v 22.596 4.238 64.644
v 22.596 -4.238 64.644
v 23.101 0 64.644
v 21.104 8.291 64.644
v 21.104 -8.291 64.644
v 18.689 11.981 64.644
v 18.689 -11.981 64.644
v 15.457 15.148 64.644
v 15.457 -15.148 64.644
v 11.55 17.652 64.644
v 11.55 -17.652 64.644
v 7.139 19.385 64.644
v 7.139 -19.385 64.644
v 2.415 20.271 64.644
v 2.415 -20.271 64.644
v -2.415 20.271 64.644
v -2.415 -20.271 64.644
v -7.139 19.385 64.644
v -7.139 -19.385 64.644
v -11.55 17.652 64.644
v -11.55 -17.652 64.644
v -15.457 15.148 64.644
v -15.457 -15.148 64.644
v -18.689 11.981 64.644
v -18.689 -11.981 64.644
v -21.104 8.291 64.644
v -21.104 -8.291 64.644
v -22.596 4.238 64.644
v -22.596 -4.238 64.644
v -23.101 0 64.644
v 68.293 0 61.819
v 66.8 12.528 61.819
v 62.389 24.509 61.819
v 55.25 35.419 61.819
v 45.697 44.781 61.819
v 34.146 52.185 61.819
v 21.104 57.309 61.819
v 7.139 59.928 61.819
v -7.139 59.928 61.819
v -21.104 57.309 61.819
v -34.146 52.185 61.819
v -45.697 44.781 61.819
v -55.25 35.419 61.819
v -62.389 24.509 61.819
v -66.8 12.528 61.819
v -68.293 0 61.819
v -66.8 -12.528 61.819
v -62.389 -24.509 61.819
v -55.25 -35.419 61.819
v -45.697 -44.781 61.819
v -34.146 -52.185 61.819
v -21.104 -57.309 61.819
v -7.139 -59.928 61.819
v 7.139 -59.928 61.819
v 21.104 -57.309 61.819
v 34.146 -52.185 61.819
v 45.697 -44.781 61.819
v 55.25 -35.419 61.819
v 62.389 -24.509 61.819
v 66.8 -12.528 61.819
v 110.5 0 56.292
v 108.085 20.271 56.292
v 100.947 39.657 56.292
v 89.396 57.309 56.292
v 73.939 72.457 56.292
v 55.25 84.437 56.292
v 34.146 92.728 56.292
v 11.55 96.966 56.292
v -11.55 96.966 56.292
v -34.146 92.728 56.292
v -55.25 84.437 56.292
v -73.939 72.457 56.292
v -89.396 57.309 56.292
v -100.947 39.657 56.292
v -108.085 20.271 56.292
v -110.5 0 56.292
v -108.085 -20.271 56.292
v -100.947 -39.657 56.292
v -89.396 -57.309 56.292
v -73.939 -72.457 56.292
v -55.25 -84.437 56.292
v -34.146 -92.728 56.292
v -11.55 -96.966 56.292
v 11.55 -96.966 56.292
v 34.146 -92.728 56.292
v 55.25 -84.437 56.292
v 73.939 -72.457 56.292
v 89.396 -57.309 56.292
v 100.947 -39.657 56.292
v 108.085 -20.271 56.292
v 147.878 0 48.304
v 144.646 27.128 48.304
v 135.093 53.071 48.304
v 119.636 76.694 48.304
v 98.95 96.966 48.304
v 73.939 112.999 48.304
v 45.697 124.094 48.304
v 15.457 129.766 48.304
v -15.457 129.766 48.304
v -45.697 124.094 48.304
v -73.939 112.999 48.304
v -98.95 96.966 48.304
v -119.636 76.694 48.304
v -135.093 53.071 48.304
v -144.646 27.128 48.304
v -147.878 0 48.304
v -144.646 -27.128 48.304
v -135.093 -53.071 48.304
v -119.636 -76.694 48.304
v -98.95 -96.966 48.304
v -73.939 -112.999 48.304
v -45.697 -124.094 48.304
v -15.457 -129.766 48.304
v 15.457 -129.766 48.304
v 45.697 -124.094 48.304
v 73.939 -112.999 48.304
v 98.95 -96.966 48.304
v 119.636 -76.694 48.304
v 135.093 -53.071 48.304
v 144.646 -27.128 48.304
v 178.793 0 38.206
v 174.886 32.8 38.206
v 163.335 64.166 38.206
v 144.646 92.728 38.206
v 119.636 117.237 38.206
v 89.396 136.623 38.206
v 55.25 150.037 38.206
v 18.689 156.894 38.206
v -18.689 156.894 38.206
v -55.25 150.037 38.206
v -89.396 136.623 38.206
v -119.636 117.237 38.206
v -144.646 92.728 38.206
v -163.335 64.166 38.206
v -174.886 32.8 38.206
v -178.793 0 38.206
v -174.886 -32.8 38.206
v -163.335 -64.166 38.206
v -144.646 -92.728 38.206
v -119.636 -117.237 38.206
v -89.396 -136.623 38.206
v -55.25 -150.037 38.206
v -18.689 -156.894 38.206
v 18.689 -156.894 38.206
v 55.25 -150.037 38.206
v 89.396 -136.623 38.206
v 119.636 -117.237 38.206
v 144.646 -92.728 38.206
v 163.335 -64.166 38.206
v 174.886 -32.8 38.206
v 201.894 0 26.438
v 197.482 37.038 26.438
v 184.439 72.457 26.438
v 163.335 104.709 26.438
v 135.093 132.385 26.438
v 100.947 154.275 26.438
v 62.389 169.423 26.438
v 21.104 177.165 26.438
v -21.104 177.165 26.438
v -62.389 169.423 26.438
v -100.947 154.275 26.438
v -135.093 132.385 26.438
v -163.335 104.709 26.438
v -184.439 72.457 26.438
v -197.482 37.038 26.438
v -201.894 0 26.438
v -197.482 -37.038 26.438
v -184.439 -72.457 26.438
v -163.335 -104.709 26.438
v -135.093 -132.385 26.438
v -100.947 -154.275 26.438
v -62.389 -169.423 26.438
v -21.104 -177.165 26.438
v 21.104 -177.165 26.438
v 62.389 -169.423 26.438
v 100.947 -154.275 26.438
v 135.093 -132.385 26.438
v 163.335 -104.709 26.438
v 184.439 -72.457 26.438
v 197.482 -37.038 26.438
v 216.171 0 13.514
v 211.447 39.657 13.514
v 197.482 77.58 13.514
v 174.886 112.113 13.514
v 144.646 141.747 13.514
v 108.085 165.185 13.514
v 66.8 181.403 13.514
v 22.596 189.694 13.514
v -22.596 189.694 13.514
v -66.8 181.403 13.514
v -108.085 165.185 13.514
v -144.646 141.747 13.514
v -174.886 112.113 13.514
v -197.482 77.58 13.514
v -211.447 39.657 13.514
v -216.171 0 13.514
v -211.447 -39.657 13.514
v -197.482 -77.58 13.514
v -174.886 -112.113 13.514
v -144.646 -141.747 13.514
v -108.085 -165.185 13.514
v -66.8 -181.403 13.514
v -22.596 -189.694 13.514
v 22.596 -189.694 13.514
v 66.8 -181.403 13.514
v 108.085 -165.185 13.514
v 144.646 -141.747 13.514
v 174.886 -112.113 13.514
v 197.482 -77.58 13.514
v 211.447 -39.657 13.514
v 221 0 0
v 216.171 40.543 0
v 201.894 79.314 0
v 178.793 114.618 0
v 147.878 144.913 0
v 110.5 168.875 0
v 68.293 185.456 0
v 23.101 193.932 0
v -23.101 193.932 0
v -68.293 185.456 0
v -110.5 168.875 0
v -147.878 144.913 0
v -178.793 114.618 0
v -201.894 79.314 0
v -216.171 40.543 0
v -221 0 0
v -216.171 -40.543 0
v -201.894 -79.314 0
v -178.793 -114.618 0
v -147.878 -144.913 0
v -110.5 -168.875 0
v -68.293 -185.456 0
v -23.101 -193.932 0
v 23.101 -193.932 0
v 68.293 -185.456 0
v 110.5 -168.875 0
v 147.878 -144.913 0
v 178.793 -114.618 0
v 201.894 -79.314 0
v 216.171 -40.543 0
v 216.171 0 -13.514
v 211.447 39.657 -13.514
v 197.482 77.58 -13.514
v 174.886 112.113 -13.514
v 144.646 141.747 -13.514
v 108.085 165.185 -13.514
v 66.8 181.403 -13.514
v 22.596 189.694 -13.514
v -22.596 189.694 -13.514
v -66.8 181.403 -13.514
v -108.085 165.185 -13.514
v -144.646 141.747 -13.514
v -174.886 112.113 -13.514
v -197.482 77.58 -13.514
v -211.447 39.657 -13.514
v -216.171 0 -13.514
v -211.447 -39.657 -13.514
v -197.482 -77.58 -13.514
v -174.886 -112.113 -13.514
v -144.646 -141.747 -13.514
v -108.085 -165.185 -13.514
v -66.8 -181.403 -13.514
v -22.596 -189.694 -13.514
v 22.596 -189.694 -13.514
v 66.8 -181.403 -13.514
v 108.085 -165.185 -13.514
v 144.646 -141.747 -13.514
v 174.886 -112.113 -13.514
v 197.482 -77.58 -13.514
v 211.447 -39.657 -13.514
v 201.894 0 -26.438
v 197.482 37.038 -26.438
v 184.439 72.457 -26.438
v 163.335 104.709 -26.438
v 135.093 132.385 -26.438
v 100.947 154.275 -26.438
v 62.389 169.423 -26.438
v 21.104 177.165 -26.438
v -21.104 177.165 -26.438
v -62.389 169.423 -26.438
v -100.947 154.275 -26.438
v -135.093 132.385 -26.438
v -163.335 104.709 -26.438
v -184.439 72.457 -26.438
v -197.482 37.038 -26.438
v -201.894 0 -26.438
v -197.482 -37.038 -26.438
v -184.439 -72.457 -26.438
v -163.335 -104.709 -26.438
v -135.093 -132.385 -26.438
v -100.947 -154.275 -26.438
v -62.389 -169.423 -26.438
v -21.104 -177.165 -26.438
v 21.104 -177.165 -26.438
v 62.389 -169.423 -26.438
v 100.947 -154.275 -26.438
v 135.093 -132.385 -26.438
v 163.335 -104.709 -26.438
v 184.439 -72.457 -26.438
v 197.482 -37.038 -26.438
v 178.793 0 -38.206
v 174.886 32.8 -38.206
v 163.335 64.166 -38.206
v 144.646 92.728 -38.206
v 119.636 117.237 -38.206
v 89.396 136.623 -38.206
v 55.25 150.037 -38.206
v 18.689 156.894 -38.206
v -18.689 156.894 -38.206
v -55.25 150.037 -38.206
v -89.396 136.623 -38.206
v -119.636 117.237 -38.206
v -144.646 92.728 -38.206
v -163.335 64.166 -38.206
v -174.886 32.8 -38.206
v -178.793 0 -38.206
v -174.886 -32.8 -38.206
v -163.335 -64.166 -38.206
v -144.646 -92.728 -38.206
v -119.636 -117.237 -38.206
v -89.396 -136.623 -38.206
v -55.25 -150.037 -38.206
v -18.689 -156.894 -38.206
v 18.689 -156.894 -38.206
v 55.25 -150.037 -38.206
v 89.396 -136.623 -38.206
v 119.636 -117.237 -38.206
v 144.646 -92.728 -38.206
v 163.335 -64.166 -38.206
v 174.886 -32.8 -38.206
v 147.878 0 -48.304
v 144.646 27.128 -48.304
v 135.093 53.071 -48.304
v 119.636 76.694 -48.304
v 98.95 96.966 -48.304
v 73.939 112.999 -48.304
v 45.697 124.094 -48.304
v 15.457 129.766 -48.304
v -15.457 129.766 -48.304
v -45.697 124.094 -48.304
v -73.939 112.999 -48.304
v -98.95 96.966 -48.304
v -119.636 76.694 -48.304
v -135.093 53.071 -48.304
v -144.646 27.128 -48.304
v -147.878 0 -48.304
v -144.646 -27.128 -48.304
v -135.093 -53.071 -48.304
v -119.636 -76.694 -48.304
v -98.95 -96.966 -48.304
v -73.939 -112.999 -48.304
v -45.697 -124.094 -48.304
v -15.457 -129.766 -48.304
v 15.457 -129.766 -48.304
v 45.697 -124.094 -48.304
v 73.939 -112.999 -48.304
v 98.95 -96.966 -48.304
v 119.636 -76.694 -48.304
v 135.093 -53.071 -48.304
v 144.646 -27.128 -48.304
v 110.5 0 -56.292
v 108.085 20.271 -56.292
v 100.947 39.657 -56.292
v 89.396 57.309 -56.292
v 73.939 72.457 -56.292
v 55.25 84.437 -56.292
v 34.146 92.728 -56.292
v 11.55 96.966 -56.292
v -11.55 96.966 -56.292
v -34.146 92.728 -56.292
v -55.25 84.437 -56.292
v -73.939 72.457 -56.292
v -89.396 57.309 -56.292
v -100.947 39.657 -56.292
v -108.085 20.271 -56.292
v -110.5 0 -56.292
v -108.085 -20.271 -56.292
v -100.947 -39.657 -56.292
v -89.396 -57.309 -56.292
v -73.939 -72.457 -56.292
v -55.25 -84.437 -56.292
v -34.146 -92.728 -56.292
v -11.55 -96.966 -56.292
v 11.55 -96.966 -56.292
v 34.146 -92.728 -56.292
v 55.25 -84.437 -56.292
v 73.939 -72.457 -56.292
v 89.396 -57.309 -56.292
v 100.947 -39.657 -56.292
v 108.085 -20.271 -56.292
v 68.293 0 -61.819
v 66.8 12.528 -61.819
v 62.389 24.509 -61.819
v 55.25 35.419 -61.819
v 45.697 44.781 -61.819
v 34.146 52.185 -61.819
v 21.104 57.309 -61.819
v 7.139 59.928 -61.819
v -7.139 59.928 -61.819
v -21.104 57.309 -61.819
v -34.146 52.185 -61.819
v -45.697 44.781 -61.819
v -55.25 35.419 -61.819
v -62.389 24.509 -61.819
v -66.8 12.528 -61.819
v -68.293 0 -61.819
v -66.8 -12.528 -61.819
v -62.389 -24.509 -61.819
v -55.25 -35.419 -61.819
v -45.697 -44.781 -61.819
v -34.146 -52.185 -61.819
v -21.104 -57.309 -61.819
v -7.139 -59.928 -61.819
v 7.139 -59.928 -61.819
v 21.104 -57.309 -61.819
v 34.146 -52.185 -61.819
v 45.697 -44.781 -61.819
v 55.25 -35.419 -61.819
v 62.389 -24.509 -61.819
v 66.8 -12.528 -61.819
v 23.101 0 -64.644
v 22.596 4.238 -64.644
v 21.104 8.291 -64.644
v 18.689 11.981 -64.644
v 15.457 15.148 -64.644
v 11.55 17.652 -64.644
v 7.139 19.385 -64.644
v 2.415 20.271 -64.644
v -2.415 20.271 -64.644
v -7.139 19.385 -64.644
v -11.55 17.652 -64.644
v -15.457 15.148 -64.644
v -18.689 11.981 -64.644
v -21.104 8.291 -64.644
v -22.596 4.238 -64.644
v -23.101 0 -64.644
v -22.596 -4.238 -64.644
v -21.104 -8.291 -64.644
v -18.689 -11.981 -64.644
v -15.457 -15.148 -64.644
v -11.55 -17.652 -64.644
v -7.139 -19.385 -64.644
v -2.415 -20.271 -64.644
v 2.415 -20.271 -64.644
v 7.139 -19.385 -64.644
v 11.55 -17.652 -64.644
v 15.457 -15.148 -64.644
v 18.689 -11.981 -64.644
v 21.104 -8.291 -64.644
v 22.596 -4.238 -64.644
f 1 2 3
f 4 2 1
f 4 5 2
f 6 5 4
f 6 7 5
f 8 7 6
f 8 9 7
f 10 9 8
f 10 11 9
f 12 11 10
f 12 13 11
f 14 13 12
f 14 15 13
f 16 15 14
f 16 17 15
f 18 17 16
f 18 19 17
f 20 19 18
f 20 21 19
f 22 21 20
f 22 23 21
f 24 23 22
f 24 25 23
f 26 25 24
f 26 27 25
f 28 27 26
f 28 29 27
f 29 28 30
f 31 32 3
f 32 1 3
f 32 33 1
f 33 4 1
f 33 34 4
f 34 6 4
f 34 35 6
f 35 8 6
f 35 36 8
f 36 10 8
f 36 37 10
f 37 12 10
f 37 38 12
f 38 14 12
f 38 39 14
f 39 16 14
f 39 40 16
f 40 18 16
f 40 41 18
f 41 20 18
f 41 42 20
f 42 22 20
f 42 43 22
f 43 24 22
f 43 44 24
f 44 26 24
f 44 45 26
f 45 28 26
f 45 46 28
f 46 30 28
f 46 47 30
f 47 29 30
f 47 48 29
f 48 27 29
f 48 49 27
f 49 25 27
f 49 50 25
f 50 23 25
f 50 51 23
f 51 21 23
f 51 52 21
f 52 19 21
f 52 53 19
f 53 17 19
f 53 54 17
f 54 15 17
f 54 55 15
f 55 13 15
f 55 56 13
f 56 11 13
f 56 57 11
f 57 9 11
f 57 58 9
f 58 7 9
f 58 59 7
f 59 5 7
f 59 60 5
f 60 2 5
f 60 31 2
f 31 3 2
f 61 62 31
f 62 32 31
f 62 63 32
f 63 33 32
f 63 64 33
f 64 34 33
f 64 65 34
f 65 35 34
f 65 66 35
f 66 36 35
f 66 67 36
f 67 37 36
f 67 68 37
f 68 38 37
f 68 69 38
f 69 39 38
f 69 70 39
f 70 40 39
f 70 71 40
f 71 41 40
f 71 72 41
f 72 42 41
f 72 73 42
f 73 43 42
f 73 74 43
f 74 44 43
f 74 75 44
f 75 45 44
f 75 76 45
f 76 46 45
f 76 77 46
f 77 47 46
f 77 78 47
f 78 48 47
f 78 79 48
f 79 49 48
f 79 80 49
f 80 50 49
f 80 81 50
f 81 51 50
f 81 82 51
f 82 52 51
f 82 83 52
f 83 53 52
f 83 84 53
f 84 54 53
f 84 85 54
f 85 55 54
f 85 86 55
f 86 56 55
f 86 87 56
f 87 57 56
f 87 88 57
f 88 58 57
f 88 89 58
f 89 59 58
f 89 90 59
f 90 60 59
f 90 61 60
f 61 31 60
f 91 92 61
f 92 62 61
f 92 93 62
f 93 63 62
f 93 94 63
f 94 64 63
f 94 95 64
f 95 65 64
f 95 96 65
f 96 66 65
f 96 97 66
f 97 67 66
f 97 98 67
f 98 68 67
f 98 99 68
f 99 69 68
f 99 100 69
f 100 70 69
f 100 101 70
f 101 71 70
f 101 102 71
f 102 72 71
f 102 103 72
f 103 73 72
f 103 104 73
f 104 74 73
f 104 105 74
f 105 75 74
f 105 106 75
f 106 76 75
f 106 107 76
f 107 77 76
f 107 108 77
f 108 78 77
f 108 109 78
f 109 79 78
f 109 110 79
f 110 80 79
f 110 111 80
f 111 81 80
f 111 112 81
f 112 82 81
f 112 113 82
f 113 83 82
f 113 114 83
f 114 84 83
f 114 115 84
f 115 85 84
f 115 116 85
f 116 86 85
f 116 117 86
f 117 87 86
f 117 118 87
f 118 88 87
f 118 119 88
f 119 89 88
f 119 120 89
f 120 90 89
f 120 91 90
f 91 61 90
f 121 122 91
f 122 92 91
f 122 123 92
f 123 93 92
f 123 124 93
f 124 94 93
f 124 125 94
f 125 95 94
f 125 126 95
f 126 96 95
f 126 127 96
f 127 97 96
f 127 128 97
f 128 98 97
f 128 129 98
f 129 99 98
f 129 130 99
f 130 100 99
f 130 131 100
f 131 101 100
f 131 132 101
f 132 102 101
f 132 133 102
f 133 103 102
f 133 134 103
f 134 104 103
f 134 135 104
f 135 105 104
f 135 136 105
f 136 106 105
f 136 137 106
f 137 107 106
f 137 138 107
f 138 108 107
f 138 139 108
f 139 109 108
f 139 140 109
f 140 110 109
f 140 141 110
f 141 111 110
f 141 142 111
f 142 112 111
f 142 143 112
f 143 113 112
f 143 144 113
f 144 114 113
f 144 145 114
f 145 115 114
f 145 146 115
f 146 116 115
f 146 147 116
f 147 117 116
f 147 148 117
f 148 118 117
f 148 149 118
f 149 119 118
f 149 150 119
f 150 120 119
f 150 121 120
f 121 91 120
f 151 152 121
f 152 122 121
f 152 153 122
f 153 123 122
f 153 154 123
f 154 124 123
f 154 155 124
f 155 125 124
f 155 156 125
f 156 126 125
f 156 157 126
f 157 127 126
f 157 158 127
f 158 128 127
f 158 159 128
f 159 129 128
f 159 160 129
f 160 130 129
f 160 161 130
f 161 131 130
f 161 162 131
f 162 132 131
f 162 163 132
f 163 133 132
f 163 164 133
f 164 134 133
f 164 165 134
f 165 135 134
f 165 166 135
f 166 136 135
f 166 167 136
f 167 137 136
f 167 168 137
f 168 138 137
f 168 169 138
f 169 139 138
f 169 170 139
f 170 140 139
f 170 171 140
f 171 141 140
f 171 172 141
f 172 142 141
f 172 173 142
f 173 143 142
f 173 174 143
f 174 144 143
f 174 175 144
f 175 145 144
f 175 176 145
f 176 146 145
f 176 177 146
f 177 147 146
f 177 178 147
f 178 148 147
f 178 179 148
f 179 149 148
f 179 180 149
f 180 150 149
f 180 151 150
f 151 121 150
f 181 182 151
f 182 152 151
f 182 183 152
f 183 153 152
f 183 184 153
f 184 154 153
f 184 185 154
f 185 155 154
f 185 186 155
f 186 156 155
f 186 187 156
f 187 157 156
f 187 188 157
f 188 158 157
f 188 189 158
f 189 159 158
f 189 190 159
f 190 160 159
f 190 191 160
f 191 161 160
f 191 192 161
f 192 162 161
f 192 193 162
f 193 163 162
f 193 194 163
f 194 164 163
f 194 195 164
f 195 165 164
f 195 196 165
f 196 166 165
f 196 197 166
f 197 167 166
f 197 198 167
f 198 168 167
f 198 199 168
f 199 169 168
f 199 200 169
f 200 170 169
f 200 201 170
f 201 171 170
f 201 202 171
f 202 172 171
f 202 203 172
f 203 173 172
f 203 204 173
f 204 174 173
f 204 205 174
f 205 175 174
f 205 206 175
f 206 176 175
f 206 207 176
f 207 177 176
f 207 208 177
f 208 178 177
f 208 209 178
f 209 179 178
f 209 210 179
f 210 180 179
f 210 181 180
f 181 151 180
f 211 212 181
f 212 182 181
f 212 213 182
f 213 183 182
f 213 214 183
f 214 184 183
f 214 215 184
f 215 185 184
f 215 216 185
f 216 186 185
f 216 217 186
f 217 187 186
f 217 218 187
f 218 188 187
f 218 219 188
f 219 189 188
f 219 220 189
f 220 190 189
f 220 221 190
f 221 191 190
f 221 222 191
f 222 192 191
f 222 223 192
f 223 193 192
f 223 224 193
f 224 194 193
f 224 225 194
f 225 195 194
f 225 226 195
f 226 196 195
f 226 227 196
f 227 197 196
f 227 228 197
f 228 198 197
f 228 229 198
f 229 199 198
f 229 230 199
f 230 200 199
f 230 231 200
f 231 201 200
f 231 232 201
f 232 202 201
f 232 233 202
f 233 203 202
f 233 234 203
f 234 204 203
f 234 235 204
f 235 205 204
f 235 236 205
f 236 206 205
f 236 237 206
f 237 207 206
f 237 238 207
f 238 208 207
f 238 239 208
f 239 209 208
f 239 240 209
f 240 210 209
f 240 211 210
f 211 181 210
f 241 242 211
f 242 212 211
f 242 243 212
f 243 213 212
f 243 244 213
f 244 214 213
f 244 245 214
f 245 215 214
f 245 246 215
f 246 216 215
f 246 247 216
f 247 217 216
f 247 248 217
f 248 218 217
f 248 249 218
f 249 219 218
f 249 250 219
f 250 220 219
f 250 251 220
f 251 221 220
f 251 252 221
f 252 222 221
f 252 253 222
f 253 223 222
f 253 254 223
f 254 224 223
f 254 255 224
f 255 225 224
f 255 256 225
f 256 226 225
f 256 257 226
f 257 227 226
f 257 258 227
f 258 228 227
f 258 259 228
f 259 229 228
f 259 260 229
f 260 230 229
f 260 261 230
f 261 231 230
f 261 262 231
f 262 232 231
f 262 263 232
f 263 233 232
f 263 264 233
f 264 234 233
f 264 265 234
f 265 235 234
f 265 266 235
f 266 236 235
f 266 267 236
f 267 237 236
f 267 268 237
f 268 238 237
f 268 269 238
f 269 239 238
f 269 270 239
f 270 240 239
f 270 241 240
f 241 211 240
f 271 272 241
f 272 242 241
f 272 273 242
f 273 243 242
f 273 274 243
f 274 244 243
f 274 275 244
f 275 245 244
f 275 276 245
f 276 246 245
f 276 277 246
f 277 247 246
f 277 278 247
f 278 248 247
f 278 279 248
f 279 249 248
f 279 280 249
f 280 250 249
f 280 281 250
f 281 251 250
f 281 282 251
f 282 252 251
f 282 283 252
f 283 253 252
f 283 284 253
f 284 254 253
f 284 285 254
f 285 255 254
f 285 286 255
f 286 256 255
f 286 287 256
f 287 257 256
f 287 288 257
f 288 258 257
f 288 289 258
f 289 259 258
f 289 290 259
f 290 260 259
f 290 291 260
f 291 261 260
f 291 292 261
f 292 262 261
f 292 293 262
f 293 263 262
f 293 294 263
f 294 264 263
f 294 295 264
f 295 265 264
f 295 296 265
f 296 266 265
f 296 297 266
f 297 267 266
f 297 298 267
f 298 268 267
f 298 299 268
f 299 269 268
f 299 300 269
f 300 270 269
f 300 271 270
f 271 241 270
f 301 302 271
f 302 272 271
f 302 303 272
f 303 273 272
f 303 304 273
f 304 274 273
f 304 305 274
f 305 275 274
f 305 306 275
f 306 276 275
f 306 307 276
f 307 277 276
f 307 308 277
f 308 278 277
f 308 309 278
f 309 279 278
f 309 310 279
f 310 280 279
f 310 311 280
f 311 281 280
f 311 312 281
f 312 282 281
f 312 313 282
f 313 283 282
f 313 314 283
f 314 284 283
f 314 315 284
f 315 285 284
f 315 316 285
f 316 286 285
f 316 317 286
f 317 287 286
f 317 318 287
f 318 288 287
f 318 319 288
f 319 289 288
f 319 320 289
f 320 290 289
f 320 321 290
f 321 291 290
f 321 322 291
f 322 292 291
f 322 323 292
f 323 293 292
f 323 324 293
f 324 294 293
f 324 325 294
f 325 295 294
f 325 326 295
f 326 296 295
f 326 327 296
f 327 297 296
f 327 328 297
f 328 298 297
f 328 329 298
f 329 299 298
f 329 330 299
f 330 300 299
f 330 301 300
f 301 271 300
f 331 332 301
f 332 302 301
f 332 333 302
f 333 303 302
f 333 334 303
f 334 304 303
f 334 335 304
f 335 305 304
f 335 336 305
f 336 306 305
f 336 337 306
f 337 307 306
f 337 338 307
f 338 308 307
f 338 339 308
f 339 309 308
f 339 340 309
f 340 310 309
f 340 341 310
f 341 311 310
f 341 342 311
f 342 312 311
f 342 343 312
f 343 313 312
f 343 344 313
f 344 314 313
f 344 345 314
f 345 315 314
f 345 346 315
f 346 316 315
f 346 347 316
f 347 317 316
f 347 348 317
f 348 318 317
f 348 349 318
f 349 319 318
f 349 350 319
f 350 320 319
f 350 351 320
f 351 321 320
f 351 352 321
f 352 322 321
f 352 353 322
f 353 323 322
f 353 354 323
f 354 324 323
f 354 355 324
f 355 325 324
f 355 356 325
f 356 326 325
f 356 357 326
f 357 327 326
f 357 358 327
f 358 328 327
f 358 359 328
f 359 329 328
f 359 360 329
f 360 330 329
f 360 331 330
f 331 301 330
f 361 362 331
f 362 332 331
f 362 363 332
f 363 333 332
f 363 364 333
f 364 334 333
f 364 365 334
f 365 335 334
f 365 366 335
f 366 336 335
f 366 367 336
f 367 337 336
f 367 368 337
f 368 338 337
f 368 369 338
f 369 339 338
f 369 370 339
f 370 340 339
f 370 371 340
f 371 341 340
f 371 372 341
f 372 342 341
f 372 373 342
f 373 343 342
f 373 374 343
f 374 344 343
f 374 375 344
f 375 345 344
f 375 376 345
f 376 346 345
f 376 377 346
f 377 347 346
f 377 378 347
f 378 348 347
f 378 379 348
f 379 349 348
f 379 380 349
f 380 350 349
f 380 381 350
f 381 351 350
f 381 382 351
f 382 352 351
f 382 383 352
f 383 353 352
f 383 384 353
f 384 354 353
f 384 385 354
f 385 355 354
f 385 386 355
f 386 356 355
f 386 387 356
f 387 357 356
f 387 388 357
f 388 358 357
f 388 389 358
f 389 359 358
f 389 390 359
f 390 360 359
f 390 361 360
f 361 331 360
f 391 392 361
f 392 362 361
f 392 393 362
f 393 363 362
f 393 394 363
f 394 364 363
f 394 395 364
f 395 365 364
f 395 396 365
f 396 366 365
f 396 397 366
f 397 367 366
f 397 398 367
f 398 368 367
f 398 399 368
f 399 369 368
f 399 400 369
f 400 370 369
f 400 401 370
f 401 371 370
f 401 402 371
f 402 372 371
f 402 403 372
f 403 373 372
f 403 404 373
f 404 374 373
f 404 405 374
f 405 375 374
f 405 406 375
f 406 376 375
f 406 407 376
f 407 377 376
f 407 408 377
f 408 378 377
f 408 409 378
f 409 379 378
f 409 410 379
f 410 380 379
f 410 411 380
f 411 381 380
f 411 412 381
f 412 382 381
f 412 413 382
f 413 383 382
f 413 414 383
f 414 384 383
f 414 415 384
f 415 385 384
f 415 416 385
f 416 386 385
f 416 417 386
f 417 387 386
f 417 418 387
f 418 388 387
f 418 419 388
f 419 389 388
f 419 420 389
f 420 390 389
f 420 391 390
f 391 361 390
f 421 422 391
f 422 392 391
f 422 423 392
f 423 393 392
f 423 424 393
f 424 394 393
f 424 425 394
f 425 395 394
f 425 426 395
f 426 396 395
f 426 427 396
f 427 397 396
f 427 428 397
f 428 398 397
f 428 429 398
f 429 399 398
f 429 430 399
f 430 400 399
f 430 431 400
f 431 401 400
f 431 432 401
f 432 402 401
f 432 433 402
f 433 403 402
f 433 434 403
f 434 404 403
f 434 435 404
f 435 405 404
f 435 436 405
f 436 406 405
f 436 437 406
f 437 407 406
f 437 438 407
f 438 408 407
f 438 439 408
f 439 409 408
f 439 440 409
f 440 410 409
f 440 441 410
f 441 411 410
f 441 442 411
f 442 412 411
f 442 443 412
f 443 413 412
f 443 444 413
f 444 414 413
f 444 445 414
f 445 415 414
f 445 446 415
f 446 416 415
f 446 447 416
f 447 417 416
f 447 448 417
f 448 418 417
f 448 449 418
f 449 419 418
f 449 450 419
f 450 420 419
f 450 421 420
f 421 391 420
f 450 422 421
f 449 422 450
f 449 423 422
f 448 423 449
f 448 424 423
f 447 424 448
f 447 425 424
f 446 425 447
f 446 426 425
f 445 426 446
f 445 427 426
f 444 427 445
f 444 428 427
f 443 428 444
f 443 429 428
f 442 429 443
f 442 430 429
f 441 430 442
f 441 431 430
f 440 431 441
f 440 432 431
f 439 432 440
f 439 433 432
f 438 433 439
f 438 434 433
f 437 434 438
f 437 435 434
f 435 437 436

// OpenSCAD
// Generated by SolidPython 1.0.1 on 2020-07-29 00:46:53


scale(v = [17, 15, 5]) {
	sphere(r = 13);
}
/***********************************************
*********      SolidPython code:      **********
************************************************
 
# import packages: SolidPython
from solid import *
from solid.utils import *
from itertools import chain, combinations, permutations


class Resize:

    def __init__(self, scad_file):
        self.scad_file = scad_file
        #self.scad_file = import_scad(scad_file)
        # cone/cylinder param:
        self.r1 = 0
        self.r2 = 0
        self.h = 0
        # rectangular prism param:
        self.w = 0
        self.l = 0
        # ellipse param:
        self.r = 0

    # import OpenScad code (file name corresponds to shape)


    # classify shape + parameters
    def assign(self, param1, param2, param3):
        if self.scad_file == 'cone.scad':
            self.r1 = param1
            self.r2 = param2
            self.h = param3
        elif self.scad_file == 'cylinder.scad':
            self.r1 = param1
            self.r2 = param2
            self.h = param3
        elif self.scad_file == 'rectangularPrism.scad':
            self.h = param1
            self.l = param2
            self.w = param3
        else:
            self.r = param1
            self.h = param2

    # resize parameters
    def iterate(self):
        x = range(3, 20, 2)
        i = 1
        if self.scad_file == 'cone.scad':
            tempList = list(permutations(x, 2))
            for temp in tempList:
                param1 = temp[0]
                param2 = temp[1]
                filepath = 'produced_scad_files/' + 'cone' + str(param1) + '_' + str(param2) + '_' + '.scad'
                scad_render_to_file(cylinder(h=param1, r1=param2, r2=0), filepath)

        elif self.scad_file == 'cylinder.scad':
            tempList = list(permutations(x, 3))
            for temp in tempList:
                param1 = temp[0]
                param2 = temp[1]
                filepath = 'produced_scad_files/' + 'cylinder' + str(param1) + '_' + str(param2) + '_' + '.scad'
                scad_render_to_file(cylinder(h=param1, r1=param2, r2=param2), filepath)

        elif self.scad_file == 'rectangularPrism.scad':
            tempList = list(permutations(x, 3))
            for temp in tempList:
                param1 = temp[0]
                param2 = temp[1]
                param3 = temp[2]
                filepath = 'produced_scad_files/' + 'rectangularPrism' + str(param1) + '_' + str(param2) + '_' + str(
                    param3) + '.scad'
                scad_render_to_file(cube(size=(param1, param2, param3)), filepath)

        elif self.scad_file == 'ellipse.scad':
            tempList = list(permutations(x, 4))
            for temp in tempList:
                param1 = temp[0]
                param2 = temp[1]
                param3 = temp[2]
                param4 = temp[3]
                filepath = 'produced_scad_files/' + 'ellipse' + str(param1) + '_' + str(param2) + '_' + str(param3) + '_' + str(param4) + '.scad'
                scad_render_to_file(scale([param1, param2, param3])(sphere(r=param4)), filepath)

    def render_to_scadfile(self):
        scad_render_to_file(scad, 'example.scad') 
 
************************************************/
